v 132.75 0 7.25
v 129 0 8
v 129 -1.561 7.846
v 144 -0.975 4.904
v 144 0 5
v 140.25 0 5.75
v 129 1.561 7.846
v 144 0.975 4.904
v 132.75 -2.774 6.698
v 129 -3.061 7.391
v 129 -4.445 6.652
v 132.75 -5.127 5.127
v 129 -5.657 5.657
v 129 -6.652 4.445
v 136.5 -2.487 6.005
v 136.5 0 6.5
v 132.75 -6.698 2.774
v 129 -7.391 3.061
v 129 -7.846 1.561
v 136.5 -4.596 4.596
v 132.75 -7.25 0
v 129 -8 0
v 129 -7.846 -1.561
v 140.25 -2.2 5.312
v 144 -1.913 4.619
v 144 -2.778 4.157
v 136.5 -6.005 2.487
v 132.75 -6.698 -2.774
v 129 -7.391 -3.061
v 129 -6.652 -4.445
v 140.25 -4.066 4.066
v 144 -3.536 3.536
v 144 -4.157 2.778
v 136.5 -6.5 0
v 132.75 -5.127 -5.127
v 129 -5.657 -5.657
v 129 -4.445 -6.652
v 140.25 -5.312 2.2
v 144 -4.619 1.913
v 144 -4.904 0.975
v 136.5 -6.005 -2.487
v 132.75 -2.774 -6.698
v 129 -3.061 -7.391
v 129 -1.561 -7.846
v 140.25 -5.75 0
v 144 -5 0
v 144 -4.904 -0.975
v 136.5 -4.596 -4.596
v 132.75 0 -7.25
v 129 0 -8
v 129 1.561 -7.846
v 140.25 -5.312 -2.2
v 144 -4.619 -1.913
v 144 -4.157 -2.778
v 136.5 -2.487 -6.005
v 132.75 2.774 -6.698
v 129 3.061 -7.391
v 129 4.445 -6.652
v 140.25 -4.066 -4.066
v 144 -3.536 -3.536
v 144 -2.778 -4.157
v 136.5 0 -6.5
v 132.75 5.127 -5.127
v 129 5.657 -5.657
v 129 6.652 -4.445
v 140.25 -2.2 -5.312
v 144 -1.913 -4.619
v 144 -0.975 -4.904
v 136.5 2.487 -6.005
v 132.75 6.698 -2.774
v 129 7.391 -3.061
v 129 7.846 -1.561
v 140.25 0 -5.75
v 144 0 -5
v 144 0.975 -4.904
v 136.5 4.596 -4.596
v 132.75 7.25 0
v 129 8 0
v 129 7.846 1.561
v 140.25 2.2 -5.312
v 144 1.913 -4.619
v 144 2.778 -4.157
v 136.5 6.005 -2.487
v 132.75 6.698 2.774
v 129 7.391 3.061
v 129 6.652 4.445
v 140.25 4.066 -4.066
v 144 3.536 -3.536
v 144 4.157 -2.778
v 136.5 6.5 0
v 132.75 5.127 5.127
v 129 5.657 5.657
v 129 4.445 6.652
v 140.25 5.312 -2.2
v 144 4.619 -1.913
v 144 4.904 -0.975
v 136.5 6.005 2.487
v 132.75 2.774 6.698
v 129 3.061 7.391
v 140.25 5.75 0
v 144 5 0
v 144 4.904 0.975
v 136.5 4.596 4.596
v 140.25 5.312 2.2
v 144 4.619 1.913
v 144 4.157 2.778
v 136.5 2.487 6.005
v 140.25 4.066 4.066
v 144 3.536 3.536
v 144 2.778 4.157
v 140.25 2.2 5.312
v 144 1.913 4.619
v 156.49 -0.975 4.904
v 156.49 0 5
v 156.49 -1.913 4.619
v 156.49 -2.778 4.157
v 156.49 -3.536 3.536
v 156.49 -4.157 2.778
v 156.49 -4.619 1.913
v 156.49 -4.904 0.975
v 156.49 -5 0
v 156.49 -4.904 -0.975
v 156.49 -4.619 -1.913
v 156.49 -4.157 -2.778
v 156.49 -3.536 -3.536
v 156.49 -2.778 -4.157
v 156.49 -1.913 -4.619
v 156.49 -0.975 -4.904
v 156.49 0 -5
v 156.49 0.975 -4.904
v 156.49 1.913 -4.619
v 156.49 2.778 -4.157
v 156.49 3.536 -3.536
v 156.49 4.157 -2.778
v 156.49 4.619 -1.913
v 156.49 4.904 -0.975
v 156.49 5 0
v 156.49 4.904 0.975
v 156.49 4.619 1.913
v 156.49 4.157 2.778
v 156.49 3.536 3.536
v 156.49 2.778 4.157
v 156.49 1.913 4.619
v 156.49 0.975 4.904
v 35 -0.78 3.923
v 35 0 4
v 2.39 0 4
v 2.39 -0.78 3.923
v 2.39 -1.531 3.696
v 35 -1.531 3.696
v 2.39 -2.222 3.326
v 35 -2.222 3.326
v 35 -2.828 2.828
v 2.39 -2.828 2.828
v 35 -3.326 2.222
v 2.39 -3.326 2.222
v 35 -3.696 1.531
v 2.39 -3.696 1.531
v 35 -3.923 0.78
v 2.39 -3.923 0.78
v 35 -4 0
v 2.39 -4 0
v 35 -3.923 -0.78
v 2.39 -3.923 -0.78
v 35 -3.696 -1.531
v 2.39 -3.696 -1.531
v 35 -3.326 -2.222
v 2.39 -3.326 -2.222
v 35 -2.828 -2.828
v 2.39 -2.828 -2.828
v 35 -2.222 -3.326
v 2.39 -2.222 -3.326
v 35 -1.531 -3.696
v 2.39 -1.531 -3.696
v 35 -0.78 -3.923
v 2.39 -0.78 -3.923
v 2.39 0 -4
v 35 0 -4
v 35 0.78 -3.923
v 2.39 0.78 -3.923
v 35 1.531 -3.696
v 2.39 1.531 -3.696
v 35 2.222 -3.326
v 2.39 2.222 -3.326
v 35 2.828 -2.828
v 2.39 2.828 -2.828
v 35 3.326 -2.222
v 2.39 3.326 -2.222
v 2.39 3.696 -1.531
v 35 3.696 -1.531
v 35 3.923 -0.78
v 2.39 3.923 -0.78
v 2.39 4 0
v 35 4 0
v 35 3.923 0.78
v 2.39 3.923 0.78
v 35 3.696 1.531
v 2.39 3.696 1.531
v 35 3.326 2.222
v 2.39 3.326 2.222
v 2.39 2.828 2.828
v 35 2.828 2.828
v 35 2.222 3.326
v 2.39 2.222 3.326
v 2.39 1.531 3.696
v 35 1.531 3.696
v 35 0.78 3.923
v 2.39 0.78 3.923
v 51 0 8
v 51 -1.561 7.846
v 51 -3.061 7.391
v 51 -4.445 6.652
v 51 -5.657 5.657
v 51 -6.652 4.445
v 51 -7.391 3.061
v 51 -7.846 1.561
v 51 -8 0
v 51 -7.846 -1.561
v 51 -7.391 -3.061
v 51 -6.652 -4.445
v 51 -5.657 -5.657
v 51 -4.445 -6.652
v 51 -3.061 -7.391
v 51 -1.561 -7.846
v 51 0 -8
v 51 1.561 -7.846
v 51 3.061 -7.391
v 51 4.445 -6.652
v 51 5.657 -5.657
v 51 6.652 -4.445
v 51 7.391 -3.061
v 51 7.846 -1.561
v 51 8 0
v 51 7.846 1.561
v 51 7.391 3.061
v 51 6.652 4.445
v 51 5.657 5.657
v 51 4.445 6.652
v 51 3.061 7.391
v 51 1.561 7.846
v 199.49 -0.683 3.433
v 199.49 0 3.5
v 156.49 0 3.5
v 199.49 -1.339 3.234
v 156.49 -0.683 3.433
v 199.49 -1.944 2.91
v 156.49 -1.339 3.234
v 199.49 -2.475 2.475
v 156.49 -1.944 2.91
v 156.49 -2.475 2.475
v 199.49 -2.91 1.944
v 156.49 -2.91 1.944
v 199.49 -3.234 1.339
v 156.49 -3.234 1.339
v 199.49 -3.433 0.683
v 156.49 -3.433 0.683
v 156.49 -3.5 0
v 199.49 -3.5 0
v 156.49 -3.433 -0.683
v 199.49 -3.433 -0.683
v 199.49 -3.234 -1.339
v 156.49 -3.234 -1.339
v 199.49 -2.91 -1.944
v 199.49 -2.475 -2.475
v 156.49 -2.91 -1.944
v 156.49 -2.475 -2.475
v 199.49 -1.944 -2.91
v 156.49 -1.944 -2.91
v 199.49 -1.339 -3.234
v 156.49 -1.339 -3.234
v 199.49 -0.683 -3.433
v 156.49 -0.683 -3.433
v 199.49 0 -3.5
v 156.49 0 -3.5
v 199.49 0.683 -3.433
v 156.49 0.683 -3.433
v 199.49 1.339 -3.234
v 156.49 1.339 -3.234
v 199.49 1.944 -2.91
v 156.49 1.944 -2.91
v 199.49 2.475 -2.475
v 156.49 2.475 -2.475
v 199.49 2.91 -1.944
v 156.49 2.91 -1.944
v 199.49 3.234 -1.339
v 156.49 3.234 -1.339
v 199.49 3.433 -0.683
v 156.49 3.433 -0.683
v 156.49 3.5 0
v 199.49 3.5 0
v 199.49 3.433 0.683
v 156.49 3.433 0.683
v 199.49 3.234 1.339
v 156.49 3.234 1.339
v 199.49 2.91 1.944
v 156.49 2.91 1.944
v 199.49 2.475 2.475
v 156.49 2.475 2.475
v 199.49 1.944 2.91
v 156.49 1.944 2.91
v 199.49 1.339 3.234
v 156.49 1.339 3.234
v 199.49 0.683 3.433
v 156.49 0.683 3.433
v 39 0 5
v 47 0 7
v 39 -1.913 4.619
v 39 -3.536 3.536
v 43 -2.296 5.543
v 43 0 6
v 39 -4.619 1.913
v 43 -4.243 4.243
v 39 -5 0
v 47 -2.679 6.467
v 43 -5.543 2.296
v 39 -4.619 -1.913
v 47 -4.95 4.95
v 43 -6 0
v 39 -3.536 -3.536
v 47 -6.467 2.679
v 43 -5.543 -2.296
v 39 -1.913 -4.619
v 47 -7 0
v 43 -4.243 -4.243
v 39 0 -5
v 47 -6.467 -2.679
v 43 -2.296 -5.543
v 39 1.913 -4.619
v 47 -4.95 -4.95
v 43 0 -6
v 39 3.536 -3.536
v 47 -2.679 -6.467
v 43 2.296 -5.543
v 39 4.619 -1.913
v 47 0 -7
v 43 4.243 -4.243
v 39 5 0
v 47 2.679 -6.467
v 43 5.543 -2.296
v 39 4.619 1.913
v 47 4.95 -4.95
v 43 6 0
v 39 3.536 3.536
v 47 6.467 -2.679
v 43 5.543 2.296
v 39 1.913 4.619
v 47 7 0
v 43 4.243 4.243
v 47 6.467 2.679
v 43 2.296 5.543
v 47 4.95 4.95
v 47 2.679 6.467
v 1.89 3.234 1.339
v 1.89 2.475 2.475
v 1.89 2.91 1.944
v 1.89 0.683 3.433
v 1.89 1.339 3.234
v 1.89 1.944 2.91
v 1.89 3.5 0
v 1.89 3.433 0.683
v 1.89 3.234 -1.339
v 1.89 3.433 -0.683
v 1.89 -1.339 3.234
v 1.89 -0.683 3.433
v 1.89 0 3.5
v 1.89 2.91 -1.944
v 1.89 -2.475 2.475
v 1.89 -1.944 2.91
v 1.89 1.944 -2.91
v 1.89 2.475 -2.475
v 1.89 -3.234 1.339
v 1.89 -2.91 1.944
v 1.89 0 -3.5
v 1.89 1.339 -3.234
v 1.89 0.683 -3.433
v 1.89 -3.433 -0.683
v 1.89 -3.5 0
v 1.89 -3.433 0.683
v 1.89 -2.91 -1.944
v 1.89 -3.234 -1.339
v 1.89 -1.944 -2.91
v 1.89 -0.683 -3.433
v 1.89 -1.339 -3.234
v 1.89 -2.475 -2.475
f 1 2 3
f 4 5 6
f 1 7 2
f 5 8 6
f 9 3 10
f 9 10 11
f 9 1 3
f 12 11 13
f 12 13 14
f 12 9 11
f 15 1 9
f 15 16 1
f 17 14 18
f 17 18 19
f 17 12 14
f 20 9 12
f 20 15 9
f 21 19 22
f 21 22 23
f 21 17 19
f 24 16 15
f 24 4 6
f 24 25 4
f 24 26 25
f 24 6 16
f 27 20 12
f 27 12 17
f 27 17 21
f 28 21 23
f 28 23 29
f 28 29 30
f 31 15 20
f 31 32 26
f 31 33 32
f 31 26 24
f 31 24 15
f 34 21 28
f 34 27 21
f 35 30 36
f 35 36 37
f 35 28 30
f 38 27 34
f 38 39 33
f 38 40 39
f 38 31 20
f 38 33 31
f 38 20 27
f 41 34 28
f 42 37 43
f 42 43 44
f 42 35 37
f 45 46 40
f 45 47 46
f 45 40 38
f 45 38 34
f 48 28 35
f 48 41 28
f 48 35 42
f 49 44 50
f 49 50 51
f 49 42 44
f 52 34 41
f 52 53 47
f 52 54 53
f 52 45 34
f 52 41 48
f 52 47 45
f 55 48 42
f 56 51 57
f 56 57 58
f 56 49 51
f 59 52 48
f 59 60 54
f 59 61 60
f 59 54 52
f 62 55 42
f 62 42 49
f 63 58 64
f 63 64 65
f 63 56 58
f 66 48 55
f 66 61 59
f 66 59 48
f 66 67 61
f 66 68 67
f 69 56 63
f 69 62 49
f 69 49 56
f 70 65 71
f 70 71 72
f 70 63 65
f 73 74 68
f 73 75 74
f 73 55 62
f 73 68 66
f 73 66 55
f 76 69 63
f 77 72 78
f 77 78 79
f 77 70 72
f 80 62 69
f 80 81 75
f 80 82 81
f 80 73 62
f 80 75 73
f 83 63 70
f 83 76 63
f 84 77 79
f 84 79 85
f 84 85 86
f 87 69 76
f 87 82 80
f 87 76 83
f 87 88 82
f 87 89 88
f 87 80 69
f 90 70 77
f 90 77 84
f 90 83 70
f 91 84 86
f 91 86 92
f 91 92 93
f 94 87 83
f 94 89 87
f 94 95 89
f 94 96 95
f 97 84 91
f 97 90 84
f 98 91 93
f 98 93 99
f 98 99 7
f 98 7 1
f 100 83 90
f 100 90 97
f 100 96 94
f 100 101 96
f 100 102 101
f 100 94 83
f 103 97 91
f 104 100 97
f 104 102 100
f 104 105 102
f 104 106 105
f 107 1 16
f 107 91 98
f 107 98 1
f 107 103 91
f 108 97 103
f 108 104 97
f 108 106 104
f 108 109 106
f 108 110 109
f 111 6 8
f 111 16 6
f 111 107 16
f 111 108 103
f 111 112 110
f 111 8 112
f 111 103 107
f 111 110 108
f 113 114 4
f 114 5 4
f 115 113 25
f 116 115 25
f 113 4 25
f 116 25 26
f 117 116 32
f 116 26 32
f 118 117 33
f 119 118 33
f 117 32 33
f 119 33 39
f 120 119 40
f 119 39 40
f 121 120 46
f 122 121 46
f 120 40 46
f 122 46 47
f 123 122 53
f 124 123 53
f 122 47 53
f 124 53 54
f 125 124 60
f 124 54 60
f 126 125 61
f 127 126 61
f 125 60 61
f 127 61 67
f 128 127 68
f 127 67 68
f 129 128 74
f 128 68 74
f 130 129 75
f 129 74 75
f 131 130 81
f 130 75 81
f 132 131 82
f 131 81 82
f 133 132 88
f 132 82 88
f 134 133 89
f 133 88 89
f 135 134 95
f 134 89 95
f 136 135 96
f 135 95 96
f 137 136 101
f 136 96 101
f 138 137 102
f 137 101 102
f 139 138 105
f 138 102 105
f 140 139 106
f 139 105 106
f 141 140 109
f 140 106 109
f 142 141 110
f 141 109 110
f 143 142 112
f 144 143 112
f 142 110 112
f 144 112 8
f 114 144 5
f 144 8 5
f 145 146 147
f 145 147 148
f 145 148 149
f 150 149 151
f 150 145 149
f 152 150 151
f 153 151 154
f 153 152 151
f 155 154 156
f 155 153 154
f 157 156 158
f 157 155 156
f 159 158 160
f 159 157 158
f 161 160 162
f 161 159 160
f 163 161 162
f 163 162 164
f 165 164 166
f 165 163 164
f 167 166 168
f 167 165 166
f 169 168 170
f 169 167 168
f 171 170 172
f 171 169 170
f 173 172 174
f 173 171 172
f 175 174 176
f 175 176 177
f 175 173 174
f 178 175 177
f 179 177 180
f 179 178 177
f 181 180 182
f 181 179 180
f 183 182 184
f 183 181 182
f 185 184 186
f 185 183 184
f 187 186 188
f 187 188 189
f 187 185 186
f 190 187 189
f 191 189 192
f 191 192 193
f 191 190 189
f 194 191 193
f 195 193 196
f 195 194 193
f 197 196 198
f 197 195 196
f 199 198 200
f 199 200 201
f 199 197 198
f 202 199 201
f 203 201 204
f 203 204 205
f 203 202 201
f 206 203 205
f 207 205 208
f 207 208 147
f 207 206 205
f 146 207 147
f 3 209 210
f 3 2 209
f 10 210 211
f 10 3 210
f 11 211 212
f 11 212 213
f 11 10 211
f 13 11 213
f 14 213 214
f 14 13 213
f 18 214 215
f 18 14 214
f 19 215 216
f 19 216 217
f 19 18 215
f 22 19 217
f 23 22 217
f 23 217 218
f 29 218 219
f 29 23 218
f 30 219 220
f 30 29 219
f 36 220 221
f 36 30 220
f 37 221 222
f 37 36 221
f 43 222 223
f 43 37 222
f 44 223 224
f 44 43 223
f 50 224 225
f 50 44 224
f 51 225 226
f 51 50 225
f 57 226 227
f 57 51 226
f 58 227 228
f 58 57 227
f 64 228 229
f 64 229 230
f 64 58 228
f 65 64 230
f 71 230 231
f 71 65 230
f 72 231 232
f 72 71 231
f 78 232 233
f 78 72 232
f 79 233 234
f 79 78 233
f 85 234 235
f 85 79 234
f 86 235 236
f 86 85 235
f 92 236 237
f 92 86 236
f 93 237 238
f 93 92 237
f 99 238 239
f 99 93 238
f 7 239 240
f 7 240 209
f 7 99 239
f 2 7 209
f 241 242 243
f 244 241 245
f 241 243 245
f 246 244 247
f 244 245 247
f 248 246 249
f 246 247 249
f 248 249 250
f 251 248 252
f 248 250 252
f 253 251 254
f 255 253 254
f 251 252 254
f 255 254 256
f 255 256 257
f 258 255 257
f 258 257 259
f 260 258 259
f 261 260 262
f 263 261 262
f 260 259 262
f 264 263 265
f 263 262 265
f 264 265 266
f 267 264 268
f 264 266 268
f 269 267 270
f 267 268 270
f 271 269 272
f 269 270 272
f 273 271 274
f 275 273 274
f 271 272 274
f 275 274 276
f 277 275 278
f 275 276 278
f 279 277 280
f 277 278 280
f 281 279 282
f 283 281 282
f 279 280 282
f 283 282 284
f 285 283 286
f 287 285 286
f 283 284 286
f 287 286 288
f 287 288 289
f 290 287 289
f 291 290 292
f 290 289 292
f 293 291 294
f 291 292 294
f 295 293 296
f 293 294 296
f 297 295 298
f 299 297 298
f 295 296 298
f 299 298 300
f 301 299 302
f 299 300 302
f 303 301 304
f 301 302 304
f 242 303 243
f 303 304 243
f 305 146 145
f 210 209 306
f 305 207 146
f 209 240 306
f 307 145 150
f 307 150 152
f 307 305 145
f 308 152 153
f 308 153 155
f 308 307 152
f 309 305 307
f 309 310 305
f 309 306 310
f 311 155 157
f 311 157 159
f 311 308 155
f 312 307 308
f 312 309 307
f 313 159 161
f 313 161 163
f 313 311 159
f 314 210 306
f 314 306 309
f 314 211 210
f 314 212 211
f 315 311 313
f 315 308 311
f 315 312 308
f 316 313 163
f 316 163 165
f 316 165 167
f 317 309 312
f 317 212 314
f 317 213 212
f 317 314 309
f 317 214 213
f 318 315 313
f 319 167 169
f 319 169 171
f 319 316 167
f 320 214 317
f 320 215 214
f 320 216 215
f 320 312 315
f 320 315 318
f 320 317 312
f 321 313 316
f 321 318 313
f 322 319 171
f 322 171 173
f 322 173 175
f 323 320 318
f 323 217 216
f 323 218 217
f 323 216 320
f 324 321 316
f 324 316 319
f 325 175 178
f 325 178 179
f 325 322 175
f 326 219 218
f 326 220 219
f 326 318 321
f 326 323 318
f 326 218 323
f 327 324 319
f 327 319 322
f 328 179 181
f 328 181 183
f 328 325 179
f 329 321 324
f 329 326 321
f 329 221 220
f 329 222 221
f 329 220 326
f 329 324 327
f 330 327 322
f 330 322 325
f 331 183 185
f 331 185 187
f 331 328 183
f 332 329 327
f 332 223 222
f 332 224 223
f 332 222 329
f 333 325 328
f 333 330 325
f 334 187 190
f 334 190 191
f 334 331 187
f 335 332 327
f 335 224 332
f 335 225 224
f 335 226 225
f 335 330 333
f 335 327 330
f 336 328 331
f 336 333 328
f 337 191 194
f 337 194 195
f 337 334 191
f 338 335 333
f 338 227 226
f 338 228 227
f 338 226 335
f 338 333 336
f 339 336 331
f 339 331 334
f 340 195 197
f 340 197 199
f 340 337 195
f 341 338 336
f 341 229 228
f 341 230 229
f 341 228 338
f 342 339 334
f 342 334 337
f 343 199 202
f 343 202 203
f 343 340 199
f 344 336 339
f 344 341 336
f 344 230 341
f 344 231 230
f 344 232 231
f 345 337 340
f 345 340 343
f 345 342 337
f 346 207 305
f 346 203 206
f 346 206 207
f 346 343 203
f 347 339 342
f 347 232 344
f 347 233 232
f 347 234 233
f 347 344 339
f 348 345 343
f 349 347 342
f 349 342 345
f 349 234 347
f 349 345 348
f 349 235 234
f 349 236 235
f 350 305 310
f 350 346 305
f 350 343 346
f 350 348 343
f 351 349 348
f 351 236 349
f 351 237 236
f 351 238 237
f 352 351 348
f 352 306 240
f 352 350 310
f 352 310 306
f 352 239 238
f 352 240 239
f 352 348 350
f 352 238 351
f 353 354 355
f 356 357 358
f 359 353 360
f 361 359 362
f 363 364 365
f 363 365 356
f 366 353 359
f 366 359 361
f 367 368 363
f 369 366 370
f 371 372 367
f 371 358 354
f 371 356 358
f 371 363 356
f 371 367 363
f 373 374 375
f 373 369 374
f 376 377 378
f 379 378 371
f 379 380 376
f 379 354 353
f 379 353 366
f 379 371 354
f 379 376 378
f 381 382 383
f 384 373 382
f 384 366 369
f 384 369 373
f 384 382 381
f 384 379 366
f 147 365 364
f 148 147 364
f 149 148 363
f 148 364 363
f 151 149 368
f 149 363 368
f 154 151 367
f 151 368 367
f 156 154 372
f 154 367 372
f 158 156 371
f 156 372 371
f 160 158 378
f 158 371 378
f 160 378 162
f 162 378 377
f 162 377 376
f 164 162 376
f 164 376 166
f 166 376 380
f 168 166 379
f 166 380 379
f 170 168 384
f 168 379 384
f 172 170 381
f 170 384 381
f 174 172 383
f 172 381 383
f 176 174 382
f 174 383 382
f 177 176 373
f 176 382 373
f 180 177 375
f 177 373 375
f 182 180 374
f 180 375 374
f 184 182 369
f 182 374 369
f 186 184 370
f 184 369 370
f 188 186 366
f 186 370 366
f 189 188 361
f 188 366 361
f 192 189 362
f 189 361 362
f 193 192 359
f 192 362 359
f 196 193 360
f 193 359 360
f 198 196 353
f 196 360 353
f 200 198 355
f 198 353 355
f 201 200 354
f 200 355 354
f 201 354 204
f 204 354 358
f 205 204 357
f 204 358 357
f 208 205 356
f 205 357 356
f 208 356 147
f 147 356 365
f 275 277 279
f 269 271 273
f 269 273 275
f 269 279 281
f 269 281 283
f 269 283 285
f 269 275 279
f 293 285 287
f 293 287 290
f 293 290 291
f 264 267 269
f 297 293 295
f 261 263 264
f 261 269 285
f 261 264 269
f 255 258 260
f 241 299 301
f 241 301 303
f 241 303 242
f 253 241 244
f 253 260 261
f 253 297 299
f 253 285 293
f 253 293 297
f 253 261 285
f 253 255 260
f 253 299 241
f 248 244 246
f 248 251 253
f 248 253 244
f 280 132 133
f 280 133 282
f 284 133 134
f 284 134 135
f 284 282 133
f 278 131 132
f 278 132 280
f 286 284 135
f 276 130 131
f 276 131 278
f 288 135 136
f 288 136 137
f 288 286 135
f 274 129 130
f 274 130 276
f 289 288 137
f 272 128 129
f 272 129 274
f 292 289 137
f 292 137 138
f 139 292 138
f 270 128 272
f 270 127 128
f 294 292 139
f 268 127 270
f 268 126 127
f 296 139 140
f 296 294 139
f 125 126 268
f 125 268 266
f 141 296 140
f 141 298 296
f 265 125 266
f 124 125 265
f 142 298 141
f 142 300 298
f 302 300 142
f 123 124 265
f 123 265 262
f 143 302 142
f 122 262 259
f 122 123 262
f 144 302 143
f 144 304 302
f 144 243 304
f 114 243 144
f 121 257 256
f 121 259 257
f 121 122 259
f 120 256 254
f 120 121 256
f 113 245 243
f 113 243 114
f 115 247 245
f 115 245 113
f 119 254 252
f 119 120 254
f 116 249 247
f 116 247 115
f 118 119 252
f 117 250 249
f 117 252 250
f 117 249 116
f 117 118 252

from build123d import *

# Parameters (mm, degrees)
PAH1_SIZE = 0.5


with BuildPart() as part:
    # Çizim1 → Döndür1 (revolve)
    with BuildSketch(Plane.XY, mode=Mode.PRIVATE) as d_nd_r1_sk:
        Polygon((1.89, 4), (35, 4), (51, 8), (129, 8), (144, 5), (154.5, 5), (156.49, 5), (156.49, 3.5), (198.5, 3.5), (199.49, 3.5), (199.49, 0), (198.5, 0), (1.89, 0), align=None)
    revolve(d_nd_r1_sk.sketch.rotate(Axis((1.89, 0, 0), (1, 0, 0)), 90), axis=Axis((1.89, 0, 0), (1, 0, 0)))

    # Pah1
    pah1_edges = [part.edges().sort_by_distance(p)[0] for p in [
        (1.89, 0, -4),
    ]]
    chamfer(pah1_edges, length=PAH1_SIZE)


solid = part.part
